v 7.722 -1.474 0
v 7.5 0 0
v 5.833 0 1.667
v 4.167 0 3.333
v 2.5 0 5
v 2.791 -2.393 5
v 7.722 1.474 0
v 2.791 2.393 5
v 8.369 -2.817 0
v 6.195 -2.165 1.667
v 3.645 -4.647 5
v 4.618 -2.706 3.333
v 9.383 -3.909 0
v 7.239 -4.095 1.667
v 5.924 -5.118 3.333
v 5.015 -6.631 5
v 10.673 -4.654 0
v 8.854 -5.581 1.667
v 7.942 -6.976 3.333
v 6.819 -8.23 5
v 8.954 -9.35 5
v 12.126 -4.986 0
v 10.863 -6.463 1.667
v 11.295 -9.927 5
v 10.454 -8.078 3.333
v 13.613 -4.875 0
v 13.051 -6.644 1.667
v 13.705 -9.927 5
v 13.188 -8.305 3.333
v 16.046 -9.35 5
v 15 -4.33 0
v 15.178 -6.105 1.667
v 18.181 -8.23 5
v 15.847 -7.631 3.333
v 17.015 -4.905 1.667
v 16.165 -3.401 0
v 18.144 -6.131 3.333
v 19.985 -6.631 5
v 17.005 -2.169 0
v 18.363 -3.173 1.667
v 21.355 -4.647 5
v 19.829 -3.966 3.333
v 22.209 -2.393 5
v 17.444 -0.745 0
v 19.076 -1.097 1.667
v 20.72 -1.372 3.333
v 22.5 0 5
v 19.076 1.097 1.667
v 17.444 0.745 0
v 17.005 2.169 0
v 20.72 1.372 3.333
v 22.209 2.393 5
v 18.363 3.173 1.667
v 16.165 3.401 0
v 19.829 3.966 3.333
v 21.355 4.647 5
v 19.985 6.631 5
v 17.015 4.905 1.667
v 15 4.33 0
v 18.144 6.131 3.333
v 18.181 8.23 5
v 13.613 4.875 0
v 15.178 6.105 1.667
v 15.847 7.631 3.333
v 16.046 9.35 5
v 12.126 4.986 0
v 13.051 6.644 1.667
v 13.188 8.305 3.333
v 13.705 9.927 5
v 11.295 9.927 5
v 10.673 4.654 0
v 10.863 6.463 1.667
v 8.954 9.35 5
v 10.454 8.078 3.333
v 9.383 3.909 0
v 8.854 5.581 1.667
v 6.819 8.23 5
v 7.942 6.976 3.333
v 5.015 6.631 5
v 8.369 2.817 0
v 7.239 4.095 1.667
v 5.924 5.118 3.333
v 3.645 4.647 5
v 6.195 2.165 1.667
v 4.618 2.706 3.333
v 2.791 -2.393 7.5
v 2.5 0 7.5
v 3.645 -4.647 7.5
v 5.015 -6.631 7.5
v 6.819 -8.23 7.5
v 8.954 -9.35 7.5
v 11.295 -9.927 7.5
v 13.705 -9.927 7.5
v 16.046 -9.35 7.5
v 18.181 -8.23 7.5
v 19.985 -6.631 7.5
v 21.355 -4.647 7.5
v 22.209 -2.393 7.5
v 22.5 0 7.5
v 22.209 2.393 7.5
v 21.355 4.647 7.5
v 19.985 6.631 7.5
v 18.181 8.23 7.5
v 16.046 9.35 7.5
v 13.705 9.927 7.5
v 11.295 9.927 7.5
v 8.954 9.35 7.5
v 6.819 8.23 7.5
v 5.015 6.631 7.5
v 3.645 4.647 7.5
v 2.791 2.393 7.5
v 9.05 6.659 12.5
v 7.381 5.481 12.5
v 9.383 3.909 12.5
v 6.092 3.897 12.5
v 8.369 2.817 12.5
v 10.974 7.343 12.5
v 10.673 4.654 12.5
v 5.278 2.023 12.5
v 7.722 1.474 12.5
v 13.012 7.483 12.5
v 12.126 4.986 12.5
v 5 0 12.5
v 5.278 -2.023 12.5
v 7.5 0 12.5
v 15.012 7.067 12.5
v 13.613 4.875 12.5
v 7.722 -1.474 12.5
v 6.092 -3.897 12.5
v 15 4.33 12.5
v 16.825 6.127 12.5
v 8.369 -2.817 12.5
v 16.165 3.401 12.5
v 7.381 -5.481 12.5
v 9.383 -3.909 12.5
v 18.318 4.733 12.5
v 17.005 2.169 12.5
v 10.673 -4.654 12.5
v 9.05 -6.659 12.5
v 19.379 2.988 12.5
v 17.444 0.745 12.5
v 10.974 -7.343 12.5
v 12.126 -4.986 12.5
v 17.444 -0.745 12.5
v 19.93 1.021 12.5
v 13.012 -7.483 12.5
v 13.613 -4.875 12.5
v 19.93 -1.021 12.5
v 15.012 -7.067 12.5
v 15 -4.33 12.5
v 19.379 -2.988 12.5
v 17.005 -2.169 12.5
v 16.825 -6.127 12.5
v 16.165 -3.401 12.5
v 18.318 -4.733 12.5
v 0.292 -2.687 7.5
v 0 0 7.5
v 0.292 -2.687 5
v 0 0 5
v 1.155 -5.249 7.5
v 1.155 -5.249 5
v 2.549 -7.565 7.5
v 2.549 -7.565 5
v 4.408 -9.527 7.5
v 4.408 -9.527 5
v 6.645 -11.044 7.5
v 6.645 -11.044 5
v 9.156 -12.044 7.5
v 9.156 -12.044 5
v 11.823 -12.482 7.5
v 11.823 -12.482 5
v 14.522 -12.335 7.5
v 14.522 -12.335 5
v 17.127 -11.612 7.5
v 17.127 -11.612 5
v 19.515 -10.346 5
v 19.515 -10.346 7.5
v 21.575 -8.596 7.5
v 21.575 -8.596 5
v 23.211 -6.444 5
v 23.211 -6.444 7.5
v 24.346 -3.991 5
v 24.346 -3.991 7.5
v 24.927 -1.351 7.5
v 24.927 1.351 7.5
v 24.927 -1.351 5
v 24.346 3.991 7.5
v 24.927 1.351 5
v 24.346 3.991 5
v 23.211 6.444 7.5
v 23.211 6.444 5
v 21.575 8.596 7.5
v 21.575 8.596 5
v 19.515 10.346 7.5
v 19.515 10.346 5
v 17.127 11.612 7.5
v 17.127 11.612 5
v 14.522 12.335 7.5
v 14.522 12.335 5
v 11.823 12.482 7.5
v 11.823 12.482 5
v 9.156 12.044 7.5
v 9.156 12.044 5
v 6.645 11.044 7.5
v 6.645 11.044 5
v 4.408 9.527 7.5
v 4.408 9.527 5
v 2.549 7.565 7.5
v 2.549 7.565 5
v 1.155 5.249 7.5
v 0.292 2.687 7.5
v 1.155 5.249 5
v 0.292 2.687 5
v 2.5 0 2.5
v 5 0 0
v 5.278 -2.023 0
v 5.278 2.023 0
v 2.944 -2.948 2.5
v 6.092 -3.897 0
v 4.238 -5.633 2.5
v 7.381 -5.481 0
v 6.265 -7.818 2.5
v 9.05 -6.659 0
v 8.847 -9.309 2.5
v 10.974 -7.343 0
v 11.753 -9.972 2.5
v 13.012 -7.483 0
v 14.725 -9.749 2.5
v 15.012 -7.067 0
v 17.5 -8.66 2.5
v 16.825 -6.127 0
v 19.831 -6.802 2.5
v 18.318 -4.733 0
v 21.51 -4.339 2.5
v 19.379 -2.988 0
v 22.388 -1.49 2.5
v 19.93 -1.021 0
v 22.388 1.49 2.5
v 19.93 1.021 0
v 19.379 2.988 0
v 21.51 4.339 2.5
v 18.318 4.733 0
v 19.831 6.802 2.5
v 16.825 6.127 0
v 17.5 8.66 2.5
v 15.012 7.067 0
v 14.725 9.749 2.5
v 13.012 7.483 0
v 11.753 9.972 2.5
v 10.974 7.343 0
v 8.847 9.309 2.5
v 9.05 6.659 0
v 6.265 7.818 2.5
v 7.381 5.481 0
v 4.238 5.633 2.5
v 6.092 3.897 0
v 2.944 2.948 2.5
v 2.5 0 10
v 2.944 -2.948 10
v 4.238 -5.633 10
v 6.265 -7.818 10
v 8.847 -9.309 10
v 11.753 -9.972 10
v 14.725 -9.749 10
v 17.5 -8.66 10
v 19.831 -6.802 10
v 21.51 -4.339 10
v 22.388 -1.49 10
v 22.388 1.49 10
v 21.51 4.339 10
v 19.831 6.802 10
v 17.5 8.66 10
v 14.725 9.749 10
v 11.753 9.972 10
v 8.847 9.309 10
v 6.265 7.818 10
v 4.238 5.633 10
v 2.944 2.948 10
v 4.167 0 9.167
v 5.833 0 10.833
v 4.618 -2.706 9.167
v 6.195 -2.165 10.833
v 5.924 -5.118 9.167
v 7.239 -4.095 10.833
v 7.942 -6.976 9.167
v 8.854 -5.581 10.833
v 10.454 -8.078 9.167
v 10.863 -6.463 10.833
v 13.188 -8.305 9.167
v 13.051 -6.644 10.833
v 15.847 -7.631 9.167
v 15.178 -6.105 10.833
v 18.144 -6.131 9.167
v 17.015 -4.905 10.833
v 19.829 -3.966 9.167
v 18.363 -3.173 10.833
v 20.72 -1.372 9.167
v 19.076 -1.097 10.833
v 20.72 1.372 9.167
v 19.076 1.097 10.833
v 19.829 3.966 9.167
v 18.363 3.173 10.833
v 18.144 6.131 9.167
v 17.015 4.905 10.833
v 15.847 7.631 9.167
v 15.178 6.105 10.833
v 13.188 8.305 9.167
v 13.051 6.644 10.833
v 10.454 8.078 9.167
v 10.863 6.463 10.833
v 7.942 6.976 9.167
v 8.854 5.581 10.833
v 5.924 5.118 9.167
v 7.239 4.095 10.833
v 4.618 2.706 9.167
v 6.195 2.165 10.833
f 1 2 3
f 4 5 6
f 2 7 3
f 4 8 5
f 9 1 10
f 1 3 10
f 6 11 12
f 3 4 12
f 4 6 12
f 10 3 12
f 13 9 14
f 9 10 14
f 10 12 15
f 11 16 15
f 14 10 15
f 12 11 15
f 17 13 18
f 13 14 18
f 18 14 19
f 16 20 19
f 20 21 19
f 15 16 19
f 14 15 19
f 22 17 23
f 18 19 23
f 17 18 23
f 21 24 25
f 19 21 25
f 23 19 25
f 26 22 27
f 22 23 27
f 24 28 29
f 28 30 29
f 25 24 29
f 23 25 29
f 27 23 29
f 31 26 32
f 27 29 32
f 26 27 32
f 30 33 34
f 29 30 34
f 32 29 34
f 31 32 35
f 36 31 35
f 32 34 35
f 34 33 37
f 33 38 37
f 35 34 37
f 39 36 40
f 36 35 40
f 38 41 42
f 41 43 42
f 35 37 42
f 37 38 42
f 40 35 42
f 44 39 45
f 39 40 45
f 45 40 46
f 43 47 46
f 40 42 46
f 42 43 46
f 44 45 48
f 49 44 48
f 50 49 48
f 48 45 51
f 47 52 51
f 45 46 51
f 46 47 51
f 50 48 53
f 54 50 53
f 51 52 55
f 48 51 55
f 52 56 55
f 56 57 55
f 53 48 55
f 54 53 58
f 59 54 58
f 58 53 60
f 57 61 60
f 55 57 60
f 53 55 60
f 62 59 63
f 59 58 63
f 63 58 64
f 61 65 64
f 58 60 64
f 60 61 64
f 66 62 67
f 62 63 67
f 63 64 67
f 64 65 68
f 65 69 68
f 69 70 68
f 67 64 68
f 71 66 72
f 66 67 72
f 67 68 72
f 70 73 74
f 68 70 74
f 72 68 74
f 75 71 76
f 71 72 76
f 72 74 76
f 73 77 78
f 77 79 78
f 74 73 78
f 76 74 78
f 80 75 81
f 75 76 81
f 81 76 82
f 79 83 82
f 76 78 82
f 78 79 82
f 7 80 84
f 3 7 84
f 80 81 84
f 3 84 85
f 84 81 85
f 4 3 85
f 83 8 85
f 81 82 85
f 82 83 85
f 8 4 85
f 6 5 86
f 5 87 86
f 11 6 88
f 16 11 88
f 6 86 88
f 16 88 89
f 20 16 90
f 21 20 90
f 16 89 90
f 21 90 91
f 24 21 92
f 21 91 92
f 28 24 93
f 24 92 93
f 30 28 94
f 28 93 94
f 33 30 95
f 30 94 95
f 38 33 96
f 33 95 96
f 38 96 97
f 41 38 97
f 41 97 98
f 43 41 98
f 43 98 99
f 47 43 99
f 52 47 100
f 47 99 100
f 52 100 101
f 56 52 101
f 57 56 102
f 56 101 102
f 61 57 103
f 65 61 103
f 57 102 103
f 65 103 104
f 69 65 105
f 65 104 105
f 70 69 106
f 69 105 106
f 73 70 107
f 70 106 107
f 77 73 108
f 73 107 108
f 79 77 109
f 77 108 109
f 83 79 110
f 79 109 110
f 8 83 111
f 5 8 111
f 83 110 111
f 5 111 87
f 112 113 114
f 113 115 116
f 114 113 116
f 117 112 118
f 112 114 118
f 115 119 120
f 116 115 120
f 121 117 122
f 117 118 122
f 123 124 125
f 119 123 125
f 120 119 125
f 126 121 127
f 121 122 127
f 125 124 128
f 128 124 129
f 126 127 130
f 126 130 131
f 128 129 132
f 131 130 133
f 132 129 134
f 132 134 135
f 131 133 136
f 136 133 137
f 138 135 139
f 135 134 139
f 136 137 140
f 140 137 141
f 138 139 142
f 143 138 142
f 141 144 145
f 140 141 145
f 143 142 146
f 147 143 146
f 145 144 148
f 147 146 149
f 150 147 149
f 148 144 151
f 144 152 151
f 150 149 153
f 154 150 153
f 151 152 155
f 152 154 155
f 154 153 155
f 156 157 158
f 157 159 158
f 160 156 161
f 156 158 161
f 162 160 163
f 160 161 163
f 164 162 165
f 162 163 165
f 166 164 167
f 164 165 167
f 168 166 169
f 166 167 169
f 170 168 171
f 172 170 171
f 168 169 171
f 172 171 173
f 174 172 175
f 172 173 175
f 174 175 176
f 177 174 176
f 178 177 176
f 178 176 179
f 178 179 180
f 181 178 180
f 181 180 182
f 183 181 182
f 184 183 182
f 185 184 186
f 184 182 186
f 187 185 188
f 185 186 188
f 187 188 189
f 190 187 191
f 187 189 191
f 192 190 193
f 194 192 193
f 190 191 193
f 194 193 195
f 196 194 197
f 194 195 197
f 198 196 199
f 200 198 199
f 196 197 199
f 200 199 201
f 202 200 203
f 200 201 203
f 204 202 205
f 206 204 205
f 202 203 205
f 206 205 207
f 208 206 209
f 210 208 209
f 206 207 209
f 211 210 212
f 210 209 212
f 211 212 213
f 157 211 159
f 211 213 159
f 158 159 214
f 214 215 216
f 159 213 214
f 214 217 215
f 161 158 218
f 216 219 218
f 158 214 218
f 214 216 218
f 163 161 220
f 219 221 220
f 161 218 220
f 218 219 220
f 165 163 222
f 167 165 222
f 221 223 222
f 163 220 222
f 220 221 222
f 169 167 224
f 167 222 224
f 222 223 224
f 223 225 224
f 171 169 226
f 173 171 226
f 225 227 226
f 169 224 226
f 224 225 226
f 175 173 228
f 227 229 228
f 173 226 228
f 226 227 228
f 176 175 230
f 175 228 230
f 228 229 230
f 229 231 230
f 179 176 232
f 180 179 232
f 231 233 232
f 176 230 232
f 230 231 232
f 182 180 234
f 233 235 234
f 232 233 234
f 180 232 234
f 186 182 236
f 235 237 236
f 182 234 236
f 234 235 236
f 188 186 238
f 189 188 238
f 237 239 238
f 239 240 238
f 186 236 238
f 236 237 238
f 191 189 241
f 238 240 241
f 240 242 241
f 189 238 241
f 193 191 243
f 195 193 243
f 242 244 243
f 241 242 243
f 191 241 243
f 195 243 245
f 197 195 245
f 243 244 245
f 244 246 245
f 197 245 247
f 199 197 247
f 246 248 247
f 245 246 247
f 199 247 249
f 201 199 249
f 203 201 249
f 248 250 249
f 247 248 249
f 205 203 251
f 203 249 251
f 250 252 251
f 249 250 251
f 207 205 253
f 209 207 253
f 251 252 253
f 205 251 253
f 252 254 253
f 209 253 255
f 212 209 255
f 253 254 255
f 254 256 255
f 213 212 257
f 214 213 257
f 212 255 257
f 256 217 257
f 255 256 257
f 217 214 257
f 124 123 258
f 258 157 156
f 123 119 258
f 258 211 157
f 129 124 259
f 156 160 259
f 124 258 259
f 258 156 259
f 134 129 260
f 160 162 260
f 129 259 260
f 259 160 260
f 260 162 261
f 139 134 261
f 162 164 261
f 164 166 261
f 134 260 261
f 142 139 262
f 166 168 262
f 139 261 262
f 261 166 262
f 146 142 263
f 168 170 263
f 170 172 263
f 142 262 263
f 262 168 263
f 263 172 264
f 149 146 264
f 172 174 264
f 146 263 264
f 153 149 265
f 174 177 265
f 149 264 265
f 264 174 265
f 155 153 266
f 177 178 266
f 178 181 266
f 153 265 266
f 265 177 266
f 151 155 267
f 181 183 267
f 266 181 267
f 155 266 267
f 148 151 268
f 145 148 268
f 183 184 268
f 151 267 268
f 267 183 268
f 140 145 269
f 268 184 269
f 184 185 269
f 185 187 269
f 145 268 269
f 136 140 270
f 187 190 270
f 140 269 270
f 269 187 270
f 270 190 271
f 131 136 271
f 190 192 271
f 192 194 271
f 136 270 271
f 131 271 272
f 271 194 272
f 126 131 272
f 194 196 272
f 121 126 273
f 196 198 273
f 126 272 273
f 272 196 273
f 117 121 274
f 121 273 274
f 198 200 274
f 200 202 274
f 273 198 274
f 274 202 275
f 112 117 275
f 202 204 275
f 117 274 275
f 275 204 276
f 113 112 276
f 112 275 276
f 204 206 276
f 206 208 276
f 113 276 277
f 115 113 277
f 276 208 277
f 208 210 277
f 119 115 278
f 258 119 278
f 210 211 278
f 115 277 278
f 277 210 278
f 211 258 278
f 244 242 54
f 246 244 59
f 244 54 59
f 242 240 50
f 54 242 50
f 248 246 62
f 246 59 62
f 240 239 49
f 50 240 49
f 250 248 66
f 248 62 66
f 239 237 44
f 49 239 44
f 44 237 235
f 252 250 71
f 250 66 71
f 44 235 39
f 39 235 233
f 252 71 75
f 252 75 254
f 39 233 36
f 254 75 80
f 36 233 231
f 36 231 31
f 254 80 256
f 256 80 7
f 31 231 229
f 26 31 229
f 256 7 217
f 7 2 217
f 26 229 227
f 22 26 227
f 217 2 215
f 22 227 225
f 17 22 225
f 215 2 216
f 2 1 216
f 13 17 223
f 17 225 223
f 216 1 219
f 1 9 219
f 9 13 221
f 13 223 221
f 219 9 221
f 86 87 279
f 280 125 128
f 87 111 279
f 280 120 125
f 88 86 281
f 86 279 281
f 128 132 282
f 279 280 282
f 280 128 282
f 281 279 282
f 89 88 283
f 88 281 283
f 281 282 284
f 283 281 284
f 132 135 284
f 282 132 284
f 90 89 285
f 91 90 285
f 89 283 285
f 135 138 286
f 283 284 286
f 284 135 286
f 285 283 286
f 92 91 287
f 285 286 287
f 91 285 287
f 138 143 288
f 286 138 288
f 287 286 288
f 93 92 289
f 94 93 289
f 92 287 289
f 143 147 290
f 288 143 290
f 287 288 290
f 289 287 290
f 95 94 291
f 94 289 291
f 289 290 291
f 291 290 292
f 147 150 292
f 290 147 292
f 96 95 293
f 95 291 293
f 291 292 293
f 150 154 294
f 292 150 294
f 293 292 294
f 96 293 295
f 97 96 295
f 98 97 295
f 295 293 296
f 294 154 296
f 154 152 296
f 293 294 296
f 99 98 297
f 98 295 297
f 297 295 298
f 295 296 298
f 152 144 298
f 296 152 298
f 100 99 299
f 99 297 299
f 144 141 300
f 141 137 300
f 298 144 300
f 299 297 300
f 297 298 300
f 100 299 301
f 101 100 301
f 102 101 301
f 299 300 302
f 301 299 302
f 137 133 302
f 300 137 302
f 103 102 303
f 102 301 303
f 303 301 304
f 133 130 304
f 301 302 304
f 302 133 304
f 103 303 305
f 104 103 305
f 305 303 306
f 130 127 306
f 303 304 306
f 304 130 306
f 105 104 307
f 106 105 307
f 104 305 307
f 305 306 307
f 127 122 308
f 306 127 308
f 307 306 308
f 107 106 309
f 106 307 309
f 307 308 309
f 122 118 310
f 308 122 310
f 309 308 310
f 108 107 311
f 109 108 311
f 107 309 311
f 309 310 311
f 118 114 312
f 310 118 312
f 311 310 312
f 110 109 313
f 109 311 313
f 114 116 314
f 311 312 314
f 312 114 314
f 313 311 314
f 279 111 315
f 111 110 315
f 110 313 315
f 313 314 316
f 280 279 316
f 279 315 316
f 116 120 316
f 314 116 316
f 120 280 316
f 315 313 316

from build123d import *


with BuildPart() as f1:
    # F0 (on Front) → F1 (revolve)
    with BuildSketch(Plane.XZ):
        Polygon((5, 12.5), (0, 7.5), (2.5, 7.5), (7.5, 12.5), align=None)
        Polygon((0, 7.5), (0, 5), (2.5, 5), (2.5, 6.25), (2.5, 7.5), align=None)
        Polygon((2.5, 5), (0, 5), (5, 0), (7.5, 0), align=None)
    revolve(axis=Axis((12.5, 0, 9.325136), (0, 0, 1)))


solid = f1.part
